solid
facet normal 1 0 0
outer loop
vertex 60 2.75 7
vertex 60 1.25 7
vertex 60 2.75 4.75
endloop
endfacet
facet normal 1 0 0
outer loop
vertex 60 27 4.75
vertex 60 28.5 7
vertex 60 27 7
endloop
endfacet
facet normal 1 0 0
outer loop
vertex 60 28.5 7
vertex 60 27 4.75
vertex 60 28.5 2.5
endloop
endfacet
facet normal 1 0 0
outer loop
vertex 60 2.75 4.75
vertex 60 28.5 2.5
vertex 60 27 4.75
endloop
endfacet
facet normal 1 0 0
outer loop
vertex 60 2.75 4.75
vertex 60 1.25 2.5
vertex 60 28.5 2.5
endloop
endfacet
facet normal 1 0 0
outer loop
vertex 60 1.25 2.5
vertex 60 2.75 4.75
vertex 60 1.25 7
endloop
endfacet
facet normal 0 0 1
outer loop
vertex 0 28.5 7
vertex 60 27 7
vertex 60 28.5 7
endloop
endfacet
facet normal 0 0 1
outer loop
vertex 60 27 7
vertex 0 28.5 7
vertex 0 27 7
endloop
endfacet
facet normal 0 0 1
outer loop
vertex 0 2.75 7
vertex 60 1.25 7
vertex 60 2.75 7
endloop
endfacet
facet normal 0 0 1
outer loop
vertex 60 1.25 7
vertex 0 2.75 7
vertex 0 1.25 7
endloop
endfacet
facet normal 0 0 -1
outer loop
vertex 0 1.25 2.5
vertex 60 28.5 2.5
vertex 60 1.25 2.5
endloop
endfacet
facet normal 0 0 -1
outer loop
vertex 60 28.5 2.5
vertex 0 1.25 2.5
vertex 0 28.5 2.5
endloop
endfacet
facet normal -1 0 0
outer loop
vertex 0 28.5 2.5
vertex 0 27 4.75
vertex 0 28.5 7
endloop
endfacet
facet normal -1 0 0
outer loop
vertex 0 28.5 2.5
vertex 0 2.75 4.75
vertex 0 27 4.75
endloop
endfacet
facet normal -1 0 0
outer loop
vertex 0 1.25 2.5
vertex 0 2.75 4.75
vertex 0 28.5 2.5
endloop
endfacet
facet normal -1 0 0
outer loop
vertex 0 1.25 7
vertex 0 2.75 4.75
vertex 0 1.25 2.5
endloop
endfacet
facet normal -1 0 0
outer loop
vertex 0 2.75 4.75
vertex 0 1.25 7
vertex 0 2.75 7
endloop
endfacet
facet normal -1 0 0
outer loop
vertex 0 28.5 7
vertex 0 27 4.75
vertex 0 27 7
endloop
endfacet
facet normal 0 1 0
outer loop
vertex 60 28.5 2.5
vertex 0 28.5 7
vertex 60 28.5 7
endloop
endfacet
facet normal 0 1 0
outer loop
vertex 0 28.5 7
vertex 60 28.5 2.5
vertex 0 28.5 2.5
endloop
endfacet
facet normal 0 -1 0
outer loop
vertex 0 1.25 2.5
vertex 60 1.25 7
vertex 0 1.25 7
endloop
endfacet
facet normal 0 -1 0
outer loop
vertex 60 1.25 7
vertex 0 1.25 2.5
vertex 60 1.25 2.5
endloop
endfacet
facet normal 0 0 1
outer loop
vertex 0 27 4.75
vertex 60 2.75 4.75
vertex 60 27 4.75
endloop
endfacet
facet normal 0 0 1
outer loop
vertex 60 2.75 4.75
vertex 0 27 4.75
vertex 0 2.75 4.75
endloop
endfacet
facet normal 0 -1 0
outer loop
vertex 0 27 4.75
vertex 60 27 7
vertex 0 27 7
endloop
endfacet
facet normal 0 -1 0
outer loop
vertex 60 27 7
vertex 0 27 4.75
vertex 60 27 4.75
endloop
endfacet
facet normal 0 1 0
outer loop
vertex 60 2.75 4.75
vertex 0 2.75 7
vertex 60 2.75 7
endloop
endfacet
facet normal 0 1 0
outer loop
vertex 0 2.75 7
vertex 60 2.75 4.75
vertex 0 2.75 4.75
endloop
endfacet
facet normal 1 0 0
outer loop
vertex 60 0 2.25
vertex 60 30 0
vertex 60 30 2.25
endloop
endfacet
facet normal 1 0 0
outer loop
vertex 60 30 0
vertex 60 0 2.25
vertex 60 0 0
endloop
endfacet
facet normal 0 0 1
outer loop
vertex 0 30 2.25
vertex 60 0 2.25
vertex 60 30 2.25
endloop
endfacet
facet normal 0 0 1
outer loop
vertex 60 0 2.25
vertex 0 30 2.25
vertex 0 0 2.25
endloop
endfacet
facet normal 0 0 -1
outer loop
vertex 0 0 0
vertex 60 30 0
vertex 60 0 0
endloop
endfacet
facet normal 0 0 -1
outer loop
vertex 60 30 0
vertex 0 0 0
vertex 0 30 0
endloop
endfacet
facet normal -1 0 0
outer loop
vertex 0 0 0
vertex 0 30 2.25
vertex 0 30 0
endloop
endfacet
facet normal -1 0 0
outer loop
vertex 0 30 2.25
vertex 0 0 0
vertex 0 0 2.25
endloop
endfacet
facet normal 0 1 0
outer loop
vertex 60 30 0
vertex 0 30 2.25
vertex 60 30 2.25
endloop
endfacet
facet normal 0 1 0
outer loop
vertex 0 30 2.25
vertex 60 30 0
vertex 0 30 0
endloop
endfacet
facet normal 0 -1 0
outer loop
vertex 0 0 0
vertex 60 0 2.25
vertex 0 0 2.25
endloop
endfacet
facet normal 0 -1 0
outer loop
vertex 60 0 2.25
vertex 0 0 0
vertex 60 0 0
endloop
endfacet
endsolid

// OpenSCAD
//cube([60,30,30]);
//Bottom piece
union()
{
    cube([60,30,2.25]);
    translate([0,1.25,2.5])difference()
    {
    cube([60,27.25,4.5]);
    //central cutaway
    translate([-4,1.5,2.25])cube([68,24.25,5.1]); //change height to 6 and width to 3mm for subtract
    //change height to 5.5mm and width to 2.5mm for positive
    
    }
}




////MAIN BODY
/*
difference()
{   
    union()
    {
    cube([60, 30,30]);
    translate([0.5,5.5,29]) linear_extrude(height = 3) text("Bard", 20.5, "Blockt:style=Regular");
        
    
    }
    translate([5,5,5])
    {
        //inner hollow part
        difference()
        {
            cube([50,20,20]);
            //support tha roof
    translate([0,-14,24]) rotate([-45,0,0]) cube([58,20,35]);
            translate([0,25,5]) rotate([45,0,0]) cube([58,20,35]);
        }
    }
    //big hole
    translate([20,15,15]) rotate([0,90,0]) cylinder(60, d = 12, d=12);
    //lil baby hole
    translate([-20,15,15]) rotate([0,90,0]) cylinder(60, d = 4, d=4);
    
union()
{
    cube([60,30,2.5]);
    translate([-1,1,2.5])difference()
    {
    cube([65,28,5]);
    //central cutaway
    translate([-4,2,2.5])cube([68,24,5.1]); //change height to 6 and width to 3mm for subtract
    //change height to 5.5mm and width to 2.5mm for positive
    
    }
}
} */
